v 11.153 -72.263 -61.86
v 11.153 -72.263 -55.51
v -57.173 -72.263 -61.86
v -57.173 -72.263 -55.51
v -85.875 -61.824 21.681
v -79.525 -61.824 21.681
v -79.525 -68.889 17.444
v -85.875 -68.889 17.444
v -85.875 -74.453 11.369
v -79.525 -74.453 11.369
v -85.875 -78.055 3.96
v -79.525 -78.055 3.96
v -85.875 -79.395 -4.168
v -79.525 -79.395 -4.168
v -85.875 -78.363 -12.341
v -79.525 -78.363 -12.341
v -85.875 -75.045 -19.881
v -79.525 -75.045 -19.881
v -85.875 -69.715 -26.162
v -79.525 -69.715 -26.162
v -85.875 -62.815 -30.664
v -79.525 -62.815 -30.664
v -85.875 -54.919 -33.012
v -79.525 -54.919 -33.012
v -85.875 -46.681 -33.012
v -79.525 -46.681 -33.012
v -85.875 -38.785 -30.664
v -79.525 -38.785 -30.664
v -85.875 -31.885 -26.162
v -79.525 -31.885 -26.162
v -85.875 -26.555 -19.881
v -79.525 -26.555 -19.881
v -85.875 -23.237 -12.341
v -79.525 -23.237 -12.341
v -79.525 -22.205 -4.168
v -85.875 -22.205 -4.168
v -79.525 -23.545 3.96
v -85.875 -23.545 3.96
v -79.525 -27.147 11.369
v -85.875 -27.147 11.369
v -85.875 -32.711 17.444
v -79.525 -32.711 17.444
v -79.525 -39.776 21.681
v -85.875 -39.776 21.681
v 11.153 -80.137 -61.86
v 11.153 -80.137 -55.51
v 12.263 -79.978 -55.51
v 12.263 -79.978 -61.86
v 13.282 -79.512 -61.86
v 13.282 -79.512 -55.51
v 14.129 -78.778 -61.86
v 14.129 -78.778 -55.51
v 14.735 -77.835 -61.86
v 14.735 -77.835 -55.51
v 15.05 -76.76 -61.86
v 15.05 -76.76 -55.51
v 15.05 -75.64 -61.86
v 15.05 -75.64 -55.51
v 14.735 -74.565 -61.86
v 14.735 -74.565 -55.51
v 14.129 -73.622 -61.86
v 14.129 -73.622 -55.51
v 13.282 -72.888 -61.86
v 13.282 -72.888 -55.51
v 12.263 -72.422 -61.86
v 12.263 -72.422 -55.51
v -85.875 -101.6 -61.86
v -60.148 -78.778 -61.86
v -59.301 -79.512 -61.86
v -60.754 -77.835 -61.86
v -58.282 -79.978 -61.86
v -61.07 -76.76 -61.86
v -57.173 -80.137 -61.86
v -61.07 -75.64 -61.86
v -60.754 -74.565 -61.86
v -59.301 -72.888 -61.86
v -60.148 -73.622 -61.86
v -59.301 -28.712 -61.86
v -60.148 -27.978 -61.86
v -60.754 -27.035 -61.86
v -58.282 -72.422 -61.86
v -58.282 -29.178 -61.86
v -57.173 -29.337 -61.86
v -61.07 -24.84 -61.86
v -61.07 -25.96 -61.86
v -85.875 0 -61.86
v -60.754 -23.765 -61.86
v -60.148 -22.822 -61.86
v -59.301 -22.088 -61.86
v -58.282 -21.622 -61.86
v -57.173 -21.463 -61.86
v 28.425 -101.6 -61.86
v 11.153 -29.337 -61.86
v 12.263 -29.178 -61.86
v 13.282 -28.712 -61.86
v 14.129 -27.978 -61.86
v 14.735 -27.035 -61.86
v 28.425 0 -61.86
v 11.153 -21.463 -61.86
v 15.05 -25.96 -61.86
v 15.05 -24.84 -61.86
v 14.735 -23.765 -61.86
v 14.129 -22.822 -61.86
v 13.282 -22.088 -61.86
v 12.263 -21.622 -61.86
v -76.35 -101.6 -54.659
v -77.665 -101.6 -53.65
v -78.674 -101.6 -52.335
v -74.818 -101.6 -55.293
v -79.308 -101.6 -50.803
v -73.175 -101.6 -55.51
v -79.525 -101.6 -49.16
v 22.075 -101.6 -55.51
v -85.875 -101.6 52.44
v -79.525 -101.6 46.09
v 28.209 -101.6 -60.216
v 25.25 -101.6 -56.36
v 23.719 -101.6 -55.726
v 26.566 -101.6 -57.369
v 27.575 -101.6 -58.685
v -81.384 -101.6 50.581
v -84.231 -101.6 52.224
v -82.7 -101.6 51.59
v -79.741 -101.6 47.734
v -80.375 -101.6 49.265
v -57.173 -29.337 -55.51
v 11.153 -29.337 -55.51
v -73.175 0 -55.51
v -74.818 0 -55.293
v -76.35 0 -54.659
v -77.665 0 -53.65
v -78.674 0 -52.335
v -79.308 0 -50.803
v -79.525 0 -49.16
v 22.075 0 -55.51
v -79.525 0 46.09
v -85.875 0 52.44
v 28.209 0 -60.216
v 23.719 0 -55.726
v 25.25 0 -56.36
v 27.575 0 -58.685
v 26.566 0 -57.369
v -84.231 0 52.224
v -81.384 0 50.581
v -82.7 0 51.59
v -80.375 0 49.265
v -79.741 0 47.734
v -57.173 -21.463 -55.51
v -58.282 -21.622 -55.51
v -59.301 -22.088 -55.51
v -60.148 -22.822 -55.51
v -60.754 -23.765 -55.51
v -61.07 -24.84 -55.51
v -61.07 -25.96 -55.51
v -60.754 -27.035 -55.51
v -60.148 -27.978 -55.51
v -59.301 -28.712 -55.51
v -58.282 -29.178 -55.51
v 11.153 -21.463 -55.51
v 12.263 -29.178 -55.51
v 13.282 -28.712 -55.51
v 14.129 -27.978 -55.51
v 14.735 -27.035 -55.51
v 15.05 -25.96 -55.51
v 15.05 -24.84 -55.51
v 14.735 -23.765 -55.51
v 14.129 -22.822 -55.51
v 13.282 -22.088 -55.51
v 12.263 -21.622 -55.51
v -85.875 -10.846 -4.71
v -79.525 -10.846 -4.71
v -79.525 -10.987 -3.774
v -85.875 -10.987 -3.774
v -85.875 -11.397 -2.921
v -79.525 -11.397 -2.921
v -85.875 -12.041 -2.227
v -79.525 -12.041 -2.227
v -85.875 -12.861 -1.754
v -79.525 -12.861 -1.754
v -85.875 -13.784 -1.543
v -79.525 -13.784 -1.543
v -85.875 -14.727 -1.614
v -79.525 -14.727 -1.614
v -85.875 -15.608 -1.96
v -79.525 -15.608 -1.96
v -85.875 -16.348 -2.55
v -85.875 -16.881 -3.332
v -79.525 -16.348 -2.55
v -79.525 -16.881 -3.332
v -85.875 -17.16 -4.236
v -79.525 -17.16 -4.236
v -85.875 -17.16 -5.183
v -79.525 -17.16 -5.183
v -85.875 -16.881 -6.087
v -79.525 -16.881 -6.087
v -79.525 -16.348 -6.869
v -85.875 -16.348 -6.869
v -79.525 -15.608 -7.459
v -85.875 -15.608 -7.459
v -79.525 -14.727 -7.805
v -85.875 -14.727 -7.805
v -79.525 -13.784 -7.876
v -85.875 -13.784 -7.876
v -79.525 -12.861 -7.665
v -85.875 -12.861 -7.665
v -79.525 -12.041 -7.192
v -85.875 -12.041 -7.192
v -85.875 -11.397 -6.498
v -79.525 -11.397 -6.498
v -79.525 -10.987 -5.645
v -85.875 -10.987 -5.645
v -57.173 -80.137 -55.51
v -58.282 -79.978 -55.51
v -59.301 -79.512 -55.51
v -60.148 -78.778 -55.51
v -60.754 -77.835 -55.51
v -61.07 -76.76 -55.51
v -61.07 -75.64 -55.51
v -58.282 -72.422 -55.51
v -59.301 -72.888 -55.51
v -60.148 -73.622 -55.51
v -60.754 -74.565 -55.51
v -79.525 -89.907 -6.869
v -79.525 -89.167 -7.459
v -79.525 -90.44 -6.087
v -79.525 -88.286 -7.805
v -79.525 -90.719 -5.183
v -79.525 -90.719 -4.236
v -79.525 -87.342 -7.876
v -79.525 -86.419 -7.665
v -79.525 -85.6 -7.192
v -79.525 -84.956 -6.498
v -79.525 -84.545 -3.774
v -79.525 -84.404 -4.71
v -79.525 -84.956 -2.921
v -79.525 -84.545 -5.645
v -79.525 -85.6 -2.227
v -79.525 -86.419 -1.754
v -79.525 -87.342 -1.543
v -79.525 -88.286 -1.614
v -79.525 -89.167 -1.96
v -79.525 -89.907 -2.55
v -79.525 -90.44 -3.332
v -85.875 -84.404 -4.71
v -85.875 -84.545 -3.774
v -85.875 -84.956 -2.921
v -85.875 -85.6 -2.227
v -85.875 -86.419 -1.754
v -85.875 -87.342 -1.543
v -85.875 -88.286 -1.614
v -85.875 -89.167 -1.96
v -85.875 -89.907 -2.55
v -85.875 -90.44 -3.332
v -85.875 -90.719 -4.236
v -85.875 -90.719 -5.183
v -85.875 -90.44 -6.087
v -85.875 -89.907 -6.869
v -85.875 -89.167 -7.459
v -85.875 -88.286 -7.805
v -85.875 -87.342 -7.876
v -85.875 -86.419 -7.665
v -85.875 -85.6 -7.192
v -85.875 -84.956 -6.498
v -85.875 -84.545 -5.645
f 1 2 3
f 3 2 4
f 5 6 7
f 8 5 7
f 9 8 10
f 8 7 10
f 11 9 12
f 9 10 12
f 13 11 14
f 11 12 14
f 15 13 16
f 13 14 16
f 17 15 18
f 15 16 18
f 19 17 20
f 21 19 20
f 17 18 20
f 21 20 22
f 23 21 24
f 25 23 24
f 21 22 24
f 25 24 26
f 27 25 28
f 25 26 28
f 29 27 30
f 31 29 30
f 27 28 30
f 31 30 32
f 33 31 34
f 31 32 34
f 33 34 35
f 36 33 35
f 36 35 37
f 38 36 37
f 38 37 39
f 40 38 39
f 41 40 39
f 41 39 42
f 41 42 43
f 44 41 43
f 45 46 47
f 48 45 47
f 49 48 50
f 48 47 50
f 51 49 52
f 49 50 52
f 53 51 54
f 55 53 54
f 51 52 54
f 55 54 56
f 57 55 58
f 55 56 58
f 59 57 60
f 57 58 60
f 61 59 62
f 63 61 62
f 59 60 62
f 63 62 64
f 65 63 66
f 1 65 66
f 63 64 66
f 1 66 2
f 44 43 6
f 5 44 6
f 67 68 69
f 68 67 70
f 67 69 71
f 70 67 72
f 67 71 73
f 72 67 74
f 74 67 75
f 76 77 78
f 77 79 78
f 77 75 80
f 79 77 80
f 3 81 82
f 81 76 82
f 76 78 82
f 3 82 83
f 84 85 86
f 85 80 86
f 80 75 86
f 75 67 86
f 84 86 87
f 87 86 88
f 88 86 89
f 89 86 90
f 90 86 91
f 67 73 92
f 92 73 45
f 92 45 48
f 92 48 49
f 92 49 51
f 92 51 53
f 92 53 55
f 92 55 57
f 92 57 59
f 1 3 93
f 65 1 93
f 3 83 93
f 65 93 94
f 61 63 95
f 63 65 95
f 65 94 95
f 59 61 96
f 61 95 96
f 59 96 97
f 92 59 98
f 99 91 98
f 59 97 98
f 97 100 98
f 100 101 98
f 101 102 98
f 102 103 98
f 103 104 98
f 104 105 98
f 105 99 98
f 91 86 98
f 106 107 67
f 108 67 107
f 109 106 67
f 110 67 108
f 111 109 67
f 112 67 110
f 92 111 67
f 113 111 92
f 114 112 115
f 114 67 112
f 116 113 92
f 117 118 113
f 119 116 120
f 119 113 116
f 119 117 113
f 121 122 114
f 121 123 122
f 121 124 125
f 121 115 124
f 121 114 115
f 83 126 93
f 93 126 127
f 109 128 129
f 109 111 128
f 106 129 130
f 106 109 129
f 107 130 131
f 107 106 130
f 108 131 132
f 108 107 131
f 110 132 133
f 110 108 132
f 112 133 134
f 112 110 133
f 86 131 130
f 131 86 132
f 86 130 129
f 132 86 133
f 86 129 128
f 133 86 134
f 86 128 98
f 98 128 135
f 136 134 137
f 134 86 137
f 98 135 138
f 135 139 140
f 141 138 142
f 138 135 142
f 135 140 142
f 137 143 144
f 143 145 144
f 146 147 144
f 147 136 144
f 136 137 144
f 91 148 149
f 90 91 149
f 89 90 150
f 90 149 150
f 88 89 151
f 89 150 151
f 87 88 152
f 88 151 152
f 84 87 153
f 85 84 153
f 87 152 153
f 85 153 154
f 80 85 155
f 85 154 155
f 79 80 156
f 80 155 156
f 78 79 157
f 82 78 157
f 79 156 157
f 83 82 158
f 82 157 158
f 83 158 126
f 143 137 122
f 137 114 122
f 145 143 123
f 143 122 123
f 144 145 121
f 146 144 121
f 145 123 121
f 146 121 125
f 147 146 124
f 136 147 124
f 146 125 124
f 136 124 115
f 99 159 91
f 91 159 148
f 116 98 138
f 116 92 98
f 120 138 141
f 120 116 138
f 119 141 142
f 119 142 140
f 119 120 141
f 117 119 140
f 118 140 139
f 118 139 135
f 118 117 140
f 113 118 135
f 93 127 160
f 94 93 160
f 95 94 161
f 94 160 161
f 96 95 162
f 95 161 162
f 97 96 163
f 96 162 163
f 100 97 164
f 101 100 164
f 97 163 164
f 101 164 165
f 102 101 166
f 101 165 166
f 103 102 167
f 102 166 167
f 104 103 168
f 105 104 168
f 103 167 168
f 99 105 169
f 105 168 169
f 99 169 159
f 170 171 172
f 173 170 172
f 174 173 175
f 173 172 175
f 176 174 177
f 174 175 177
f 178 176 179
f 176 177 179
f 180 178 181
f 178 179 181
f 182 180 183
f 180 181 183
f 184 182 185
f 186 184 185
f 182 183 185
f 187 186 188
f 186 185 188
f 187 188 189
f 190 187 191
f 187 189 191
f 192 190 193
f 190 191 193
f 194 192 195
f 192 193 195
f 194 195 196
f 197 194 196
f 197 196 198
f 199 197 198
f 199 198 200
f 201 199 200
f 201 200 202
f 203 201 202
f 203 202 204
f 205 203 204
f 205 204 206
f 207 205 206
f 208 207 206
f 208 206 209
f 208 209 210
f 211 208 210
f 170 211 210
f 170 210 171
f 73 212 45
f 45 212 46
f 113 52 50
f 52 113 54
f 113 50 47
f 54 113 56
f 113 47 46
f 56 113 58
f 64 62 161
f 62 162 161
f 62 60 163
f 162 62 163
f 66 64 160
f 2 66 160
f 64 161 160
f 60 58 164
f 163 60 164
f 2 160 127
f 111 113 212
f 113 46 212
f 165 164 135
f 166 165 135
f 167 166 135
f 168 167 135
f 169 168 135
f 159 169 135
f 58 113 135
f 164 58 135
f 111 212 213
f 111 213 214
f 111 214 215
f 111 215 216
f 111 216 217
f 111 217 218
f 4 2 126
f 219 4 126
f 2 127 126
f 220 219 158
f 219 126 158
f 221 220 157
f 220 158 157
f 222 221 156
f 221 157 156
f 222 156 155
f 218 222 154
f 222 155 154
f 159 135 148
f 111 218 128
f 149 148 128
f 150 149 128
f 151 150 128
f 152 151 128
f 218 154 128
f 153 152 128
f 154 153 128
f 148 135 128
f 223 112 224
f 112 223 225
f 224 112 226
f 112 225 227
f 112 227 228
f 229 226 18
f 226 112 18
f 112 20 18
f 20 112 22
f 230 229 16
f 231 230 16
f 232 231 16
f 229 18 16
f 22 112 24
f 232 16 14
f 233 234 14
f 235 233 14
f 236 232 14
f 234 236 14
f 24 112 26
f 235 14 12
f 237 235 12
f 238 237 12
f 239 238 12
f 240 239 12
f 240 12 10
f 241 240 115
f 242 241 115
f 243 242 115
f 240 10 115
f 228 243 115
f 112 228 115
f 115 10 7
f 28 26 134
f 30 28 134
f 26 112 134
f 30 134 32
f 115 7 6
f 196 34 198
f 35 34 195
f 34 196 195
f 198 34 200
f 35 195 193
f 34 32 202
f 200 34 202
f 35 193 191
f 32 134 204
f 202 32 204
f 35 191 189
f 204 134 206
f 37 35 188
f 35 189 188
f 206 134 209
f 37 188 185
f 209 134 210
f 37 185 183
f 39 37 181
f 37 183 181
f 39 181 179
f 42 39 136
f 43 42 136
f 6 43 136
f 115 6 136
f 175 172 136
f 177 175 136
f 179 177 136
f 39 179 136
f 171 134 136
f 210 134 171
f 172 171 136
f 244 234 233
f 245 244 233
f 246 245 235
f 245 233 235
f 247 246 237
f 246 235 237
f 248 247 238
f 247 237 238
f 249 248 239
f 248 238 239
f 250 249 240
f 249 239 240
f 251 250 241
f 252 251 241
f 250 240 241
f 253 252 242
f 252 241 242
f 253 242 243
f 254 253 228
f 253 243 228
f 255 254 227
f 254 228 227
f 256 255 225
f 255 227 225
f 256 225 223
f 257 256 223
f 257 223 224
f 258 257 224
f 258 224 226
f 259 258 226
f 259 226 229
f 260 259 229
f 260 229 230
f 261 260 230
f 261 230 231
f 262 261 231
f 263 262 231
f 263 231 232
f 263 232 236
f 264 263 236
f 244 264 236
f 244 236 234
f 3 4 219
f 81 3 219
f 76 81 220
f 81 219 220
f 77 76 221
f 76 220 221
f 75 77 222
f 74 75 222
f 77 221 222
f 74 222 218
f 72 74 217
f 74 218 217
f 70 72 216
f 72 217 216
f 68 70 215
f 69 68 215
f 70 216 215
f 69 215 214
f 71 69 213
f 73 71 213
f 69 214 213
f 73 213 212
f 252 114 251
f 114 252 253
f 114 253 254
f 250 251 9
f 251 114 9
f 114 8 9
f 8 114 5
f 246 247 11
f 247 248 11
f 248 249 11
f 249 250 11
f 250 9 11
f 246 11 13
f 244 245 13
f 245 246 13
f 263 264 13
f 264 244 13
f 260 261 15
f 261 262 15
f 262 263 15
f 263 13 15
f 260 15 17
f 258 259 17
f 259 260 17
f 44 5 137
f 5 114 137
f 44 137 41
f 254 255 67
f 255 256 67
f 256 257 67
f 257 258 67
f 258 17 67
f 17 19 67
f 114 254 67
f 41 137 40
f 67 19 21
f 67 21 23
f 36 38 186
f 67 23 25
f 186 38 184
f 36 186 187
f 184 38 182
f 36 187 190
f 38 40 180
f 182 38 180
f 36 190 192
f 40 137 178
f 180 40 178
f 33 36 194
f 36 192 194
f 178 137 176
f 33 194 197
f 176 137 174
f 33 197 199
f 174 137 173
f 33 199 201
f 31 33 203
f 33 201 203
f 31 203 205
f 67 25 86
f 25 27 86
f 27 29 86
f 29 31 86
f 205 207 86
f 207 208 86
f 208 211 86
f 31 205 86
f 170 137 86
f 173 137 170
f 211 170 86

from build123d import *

# Parameters (mm, degrees)
F1_DEPTH = 101.6
F2_R     = 6.34999
F3_R     = 3.175
F4_DEPTH = 25.4
F6_DEPTH = 25.4


# Not quite as in the source:
# - a fillet or chamfer is up to 0.001 mm smaller than in the source, because OpenCascade refuses the exact size


with BuildPart() as f1:
    # F0 (on Front) → F1 (new body)
    with BuildSketch(Plane.XZ):
        Polygon((-79.5245949868, 52.4404040542), (-85.8745949868, 52.4404040542), (-85.8745949868, -61.8595959458), (28.4254050132, -61.8595959458), (28.4254050132, -55.5095959458), (-79.5245949868, -55.5095959458), align=None)
    extrude(amount=F1_DEPTH)

    # F2 (radius 6.35 in the source; OpenCascade refuses exactly that, so slightly less here)
    f2_edges = [f1.edges().sort_by_distance(p)[0] for p in [
        (-79.524595, -50.8, 52.440404),
        (28.425405, -50.8, -55.509596),
        (-79.524595, -50.8, -55.509596),
    ]]
    fillet(f2_edges, radius=F2_R)

    # F3 (on face) → F4 (cut)
    with BuildSketch(Plane.YZ.offset(-79.5245949868)):
        with BuildLine():
            Line((-39.7764292627, 21.6810040542), (-61.8235707373, 21.6810040542))
            ThreePointArc((-61.8235707373, 21.6810040542), (-50.8, -33.3099959458), (-39.7764292627, 21.6810040542))
        make_face()
        with Locations((-87.5792, -4.7095959458)):
            Circle(F3_R)
        with Locations((-14.0208, -4.7095959458)):
            Circle(F3_R)
    extrude(amount=-F4_DEPTH, mode=Mode.SUBTRACT)

    # F5 (on face) → F6 (cut)
    with BuildSketch(Plane.XY.offset(-55.5095959458)):
        with BuildLine():
            ThreePointArc((-57.1725949868, -72.263), (-61.1095949868, -76.2), (-57.1725949868, -80.137))
            Line((-57.1725949868, -80.137), (11.1534050132, -80.137))
            ThreePointArc((11.1534050132, -80.137), (15.0904050132, -76.2), (11.1534050132, -72.263))
            Line((11.1534050132, -72.263), (-57.1725949868, -72.263))
        make_face()
        with BuildLine():
            ThreePointArc((-57.1725949868, -21.463), (-61.1095949868, -25.4), (-57.1725949868, -29.337))
            Line((-57.1725949868, -29.337), (11.1534050132, -29.337))
            ThreePointArc((11.1534050132, -29.337), (15.0904050132, -25.4), (11.1534050132, -21.463))
            Line((11.1534050132, -21.463), (-57.1725949868, -21.463))
        make_face()
    extrude(amount=-F6_DEPTH, mode=Mode.SUBTRACT)


solid = f1.part
